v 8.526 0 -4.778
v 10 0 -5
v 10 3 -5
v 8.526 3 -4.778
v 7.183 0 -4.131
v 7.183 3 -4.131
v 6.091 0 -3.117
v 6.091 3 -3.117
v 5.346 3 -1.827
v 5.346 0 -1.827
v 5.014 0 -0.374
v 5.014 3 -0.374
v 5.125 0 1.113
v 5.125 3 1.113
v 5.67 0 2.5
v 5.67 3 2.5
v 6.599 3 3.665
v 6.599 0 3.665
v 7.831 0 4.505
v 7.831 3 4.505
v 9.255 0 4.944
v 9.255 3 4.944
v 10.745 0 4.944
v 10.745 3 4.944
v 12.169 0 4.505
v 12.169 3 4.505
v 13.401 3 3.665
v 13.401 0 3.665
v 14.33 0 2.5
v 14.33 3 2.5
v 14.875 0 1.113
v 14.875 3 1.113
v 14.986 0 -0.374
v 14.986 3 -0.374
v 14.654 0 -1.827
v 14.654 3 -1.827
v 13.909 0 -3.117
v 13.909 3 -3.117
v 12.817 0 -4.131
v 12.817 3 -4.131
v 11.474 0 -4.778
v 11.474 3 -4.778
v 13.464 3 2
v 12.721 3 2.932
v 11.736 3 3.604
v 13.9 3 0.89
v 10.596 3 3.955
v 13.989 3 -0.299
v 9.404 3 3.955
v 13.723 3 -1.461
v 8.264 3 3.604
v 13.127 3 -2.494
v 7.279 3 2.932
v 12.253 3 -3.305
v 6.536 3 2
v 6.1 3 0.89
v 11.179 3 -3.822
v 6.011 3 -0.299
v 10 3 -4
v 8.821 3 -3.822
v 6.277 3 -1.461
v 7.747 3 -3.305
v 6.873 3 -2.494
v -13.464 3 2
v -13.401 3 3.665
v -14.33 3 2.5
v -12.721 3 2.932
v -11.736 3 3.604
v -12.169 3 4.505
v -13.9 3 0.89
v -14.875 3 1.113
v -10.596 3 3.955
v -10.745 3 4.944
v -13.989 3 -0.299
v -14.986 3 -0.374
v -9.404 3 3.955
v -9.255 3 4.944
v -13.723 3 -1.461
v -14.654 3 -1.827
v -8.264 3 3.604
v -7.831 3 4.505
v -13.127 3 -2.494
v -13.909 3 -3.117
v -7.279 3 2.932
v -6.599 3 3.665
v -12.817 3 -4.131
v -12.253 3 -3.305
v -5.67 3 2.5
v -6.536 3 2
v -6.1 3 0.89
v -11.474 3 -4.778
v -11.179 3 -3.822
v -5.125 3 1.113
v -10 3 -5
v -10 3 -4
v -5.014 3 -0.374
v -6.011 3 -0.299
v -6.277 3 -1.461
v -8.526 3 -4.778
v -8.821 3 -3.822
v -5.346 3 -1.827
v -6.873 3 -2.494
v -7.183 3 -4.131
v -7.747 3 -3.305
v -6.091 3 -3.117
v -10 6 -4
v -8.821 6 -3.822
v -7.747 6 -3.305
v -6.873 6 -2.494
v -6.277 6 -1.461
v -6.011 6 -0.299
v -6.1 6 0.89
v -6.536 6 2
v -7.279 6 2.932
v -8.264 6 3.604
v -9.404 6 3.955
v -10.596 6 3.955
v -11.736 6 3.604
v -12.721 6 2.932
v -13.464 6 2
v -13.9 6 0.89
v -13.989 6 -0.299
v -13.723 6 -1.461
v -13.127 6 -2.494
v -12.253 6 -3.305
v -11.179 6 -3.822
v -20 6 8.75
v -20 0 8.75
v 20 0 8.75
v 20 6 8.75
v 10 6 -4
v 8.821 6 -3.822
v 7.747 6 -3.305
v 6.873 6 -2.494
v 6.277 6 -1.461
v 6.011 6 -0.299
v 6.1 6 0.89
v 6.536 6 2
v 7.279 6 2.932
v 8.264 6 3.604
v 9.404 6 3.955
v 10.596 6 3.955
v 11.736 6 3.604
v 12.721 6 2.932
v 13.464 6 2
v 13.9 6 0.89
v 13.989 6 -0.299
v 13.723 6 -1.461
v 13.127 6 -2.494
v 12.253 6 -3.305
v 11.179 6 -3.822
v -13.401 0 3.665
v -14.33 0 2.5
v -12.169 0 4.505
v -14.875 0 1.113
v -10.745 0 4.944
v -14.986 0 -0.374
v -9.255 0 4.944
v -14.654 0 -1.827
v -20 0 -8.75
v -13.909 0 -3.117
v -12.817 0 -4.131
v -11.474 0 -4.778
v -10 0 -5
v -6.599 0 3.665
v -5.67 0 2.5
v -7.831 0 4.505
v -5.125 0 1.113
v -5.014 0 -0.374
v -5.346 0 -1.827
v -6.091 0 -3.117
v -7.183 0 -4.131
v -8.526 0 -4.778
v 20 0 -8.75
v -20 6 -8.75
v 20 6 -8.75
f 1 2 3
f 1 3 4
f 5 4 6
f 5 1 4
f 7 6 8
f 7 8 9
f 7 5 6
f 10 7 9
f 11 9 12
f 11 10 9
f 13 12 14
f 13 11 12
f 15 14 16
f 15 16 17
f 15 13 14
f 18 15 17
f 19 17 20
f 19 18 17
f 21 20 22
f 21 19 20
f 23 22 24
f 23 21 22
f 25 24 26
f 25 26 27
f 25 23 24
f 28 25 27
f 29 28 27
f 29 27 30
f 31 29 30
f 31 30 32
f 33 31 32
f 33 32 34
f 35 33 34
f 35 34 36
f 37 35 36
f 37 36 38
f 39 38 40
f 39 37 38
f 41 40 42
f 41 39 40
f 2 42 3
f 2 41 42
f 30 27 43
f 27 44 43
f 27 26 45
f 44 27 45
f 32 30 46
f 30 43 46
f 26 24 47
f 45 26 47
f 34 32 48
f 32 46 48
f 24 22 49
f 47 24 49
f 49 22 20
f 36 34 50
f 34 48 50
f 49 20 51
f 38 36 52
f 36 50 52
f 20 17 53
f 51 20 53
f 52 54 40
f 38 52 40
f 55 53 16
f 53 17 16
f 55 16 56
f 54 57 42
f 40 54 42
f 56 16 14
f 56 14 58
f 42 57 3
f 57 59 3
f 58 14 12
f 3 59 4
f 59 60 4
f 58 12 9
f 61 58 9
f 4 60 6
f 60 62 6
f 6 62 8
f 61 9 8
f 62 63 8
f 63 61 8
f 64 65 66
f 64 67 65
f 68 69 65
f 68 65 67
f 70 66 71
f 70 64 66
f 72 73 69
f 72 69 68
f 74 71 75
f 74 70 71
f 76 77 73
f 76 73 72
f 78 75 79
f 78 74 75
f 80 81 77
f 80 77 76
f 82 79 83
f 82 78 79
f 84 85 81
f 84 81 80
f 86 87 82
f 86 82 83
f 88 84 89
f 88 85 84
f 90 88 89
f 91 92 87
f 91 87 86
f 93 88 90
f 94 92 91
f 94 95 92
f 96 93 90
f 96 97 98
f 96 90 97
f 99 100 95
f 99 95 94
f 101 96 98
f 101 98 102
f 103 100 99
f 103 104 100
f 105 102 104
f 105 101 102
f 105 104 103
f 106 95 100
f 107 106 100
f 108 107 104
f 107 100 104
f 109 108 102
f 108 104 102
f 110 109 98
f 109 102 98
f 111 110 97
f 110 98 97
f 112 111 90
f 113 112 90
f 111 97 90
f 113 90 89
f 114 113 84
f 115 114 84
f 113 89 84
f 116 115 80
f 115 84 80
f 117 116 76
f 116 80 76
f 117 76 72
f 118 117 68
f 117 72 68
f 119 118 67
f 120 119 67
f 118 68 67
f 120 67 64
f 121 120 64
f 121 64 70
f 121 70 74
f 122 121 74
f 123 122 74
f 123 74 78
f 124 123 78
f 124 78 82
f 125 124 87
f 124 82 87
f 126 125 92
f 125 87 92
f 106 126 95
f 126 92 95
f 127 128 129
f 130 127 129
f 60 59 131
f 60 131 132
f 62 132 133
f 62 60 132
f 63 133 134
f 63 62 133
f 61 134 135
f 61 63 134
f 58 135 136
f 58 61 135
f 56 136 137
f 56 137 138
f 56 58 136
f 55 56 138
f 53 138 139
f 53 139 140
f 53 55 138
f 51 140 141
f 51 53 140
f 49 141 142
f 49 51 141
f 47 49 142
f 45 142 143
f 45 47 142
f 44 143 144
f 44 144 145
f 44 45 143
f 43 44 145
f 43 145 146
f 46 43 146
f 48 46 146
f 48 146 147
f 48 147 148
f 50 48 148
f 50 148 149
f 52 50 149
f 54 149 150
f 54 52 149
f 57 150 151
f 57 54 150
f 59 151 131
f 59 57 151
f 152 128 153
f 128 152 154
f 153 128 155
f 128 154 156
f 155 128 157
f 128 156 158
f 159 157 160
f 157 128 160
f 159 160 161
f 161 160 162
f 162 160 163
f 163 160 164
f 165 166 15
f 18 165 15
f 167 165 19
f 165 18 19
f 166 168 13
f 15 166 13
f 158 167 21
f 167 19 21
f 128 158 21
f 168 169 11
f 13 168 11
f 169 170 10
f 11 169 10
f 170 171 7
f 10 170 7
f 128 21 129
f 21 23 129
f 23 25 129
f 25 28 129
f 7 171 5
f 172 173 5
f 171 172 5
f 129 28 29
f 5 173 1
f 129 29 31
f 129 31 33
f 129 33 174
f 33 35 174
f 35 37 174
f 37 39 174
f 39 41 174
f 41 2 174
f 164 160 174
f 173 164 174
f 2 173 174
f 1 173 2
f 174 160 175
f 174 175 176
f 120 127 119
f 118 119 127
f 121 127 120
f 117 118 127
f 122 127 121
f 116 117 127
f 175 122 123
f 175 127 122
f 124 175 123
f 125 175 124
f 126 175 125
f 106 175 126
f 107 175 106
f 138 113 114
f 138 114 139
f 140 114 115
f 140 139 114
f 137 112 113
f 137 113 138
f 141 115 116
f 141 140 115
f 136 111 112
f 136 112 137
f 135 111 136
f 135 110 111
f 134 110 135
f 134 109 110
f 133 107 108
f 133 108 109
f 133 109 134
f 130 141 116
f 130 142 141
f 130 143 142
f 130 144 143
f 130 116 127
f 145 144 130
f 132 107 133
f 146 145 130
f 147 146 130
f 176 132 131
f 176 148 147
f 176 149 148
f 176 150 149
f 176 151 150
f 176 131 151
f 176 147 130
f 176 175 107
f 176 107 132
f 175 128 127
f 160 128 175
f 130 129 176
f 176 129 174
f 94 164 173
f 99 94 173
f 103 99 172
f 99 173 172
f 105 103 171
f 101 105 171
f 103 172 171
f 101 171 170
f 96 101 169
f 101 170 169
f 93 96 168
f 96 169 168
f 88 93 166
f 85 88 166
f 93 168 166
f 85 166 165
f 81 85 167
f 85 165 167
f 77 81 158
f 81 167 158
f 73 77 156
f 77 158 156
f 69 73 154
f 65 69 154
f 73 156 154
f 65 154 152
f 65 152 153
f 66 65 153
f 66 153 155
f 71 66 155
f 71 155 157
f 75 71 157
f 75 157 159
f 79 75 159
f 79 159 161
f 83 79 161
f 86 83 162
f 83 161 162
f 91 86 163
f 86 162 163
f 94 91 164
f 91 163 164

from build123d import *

# Parameters (mm, degrees)
SKETCH5_W       = 40
SKETCH5_H       = 17.5
EXTRUDE8_DEPTH  = 6
SKETCH7_R       = 5
EXTRUDE9_DEPTH  = 3
SKETCH8_R       = 4
EXTRUDE10_DEPTH = 3


with BuildPart() as part:
    # Sketch5 → Extrude8 (new body)
    with BuildSketch(Plane(origin=(0, 0, 0), x_dir=(1, 0, 0), z_dir=(0, 1, 0))):
        Rectangle(SKETCH5_W, SKETCH5_H)
    extrude(amount=EXTRUDE8_DEPTH)

    # Sketch7 → Extrude9 (cut)
    with BuildSketch(Plane.XZ):
        with Locations(Location((-10, 0, 0), (0, 0, 270))):  # turned: the seam where the file's is
            Circle(SKETCH7_R)
    extrude9 = extrude(amount=-EXTRUDE9_DEPTH, mode=Mode.SUBTRACT)

    # Sketch8 → Extrude10 (cut)
    with BuildSketch(Plane.XZ.offset(-3)):
        with Locations(Location((-10, 0, 0), (0, 0, 270))):  # turned: the seam where the file's is
            Circle(SKETCH8_R)
    extrude10 = extrude(amount=-EXTRUDE10_DEPTH, mode=Mode.SUBTRACT)

    # Mirror2: Extrude9, Extrude10 across plane
    add(extrude9.mirror(Plane(origin=(0, 0, 0), x_dir=(0, 0, 1), z_dir=(1, 0, 0))), mode=Mode.SUBTRACT)
    add(extrude10.mirror(Plane(origin=(0, 0, 0), x_dir=(0, 0, 1), z_dir=(1, 0, 0))), mode=Mode.SUBTRACT)


solid = part.part
